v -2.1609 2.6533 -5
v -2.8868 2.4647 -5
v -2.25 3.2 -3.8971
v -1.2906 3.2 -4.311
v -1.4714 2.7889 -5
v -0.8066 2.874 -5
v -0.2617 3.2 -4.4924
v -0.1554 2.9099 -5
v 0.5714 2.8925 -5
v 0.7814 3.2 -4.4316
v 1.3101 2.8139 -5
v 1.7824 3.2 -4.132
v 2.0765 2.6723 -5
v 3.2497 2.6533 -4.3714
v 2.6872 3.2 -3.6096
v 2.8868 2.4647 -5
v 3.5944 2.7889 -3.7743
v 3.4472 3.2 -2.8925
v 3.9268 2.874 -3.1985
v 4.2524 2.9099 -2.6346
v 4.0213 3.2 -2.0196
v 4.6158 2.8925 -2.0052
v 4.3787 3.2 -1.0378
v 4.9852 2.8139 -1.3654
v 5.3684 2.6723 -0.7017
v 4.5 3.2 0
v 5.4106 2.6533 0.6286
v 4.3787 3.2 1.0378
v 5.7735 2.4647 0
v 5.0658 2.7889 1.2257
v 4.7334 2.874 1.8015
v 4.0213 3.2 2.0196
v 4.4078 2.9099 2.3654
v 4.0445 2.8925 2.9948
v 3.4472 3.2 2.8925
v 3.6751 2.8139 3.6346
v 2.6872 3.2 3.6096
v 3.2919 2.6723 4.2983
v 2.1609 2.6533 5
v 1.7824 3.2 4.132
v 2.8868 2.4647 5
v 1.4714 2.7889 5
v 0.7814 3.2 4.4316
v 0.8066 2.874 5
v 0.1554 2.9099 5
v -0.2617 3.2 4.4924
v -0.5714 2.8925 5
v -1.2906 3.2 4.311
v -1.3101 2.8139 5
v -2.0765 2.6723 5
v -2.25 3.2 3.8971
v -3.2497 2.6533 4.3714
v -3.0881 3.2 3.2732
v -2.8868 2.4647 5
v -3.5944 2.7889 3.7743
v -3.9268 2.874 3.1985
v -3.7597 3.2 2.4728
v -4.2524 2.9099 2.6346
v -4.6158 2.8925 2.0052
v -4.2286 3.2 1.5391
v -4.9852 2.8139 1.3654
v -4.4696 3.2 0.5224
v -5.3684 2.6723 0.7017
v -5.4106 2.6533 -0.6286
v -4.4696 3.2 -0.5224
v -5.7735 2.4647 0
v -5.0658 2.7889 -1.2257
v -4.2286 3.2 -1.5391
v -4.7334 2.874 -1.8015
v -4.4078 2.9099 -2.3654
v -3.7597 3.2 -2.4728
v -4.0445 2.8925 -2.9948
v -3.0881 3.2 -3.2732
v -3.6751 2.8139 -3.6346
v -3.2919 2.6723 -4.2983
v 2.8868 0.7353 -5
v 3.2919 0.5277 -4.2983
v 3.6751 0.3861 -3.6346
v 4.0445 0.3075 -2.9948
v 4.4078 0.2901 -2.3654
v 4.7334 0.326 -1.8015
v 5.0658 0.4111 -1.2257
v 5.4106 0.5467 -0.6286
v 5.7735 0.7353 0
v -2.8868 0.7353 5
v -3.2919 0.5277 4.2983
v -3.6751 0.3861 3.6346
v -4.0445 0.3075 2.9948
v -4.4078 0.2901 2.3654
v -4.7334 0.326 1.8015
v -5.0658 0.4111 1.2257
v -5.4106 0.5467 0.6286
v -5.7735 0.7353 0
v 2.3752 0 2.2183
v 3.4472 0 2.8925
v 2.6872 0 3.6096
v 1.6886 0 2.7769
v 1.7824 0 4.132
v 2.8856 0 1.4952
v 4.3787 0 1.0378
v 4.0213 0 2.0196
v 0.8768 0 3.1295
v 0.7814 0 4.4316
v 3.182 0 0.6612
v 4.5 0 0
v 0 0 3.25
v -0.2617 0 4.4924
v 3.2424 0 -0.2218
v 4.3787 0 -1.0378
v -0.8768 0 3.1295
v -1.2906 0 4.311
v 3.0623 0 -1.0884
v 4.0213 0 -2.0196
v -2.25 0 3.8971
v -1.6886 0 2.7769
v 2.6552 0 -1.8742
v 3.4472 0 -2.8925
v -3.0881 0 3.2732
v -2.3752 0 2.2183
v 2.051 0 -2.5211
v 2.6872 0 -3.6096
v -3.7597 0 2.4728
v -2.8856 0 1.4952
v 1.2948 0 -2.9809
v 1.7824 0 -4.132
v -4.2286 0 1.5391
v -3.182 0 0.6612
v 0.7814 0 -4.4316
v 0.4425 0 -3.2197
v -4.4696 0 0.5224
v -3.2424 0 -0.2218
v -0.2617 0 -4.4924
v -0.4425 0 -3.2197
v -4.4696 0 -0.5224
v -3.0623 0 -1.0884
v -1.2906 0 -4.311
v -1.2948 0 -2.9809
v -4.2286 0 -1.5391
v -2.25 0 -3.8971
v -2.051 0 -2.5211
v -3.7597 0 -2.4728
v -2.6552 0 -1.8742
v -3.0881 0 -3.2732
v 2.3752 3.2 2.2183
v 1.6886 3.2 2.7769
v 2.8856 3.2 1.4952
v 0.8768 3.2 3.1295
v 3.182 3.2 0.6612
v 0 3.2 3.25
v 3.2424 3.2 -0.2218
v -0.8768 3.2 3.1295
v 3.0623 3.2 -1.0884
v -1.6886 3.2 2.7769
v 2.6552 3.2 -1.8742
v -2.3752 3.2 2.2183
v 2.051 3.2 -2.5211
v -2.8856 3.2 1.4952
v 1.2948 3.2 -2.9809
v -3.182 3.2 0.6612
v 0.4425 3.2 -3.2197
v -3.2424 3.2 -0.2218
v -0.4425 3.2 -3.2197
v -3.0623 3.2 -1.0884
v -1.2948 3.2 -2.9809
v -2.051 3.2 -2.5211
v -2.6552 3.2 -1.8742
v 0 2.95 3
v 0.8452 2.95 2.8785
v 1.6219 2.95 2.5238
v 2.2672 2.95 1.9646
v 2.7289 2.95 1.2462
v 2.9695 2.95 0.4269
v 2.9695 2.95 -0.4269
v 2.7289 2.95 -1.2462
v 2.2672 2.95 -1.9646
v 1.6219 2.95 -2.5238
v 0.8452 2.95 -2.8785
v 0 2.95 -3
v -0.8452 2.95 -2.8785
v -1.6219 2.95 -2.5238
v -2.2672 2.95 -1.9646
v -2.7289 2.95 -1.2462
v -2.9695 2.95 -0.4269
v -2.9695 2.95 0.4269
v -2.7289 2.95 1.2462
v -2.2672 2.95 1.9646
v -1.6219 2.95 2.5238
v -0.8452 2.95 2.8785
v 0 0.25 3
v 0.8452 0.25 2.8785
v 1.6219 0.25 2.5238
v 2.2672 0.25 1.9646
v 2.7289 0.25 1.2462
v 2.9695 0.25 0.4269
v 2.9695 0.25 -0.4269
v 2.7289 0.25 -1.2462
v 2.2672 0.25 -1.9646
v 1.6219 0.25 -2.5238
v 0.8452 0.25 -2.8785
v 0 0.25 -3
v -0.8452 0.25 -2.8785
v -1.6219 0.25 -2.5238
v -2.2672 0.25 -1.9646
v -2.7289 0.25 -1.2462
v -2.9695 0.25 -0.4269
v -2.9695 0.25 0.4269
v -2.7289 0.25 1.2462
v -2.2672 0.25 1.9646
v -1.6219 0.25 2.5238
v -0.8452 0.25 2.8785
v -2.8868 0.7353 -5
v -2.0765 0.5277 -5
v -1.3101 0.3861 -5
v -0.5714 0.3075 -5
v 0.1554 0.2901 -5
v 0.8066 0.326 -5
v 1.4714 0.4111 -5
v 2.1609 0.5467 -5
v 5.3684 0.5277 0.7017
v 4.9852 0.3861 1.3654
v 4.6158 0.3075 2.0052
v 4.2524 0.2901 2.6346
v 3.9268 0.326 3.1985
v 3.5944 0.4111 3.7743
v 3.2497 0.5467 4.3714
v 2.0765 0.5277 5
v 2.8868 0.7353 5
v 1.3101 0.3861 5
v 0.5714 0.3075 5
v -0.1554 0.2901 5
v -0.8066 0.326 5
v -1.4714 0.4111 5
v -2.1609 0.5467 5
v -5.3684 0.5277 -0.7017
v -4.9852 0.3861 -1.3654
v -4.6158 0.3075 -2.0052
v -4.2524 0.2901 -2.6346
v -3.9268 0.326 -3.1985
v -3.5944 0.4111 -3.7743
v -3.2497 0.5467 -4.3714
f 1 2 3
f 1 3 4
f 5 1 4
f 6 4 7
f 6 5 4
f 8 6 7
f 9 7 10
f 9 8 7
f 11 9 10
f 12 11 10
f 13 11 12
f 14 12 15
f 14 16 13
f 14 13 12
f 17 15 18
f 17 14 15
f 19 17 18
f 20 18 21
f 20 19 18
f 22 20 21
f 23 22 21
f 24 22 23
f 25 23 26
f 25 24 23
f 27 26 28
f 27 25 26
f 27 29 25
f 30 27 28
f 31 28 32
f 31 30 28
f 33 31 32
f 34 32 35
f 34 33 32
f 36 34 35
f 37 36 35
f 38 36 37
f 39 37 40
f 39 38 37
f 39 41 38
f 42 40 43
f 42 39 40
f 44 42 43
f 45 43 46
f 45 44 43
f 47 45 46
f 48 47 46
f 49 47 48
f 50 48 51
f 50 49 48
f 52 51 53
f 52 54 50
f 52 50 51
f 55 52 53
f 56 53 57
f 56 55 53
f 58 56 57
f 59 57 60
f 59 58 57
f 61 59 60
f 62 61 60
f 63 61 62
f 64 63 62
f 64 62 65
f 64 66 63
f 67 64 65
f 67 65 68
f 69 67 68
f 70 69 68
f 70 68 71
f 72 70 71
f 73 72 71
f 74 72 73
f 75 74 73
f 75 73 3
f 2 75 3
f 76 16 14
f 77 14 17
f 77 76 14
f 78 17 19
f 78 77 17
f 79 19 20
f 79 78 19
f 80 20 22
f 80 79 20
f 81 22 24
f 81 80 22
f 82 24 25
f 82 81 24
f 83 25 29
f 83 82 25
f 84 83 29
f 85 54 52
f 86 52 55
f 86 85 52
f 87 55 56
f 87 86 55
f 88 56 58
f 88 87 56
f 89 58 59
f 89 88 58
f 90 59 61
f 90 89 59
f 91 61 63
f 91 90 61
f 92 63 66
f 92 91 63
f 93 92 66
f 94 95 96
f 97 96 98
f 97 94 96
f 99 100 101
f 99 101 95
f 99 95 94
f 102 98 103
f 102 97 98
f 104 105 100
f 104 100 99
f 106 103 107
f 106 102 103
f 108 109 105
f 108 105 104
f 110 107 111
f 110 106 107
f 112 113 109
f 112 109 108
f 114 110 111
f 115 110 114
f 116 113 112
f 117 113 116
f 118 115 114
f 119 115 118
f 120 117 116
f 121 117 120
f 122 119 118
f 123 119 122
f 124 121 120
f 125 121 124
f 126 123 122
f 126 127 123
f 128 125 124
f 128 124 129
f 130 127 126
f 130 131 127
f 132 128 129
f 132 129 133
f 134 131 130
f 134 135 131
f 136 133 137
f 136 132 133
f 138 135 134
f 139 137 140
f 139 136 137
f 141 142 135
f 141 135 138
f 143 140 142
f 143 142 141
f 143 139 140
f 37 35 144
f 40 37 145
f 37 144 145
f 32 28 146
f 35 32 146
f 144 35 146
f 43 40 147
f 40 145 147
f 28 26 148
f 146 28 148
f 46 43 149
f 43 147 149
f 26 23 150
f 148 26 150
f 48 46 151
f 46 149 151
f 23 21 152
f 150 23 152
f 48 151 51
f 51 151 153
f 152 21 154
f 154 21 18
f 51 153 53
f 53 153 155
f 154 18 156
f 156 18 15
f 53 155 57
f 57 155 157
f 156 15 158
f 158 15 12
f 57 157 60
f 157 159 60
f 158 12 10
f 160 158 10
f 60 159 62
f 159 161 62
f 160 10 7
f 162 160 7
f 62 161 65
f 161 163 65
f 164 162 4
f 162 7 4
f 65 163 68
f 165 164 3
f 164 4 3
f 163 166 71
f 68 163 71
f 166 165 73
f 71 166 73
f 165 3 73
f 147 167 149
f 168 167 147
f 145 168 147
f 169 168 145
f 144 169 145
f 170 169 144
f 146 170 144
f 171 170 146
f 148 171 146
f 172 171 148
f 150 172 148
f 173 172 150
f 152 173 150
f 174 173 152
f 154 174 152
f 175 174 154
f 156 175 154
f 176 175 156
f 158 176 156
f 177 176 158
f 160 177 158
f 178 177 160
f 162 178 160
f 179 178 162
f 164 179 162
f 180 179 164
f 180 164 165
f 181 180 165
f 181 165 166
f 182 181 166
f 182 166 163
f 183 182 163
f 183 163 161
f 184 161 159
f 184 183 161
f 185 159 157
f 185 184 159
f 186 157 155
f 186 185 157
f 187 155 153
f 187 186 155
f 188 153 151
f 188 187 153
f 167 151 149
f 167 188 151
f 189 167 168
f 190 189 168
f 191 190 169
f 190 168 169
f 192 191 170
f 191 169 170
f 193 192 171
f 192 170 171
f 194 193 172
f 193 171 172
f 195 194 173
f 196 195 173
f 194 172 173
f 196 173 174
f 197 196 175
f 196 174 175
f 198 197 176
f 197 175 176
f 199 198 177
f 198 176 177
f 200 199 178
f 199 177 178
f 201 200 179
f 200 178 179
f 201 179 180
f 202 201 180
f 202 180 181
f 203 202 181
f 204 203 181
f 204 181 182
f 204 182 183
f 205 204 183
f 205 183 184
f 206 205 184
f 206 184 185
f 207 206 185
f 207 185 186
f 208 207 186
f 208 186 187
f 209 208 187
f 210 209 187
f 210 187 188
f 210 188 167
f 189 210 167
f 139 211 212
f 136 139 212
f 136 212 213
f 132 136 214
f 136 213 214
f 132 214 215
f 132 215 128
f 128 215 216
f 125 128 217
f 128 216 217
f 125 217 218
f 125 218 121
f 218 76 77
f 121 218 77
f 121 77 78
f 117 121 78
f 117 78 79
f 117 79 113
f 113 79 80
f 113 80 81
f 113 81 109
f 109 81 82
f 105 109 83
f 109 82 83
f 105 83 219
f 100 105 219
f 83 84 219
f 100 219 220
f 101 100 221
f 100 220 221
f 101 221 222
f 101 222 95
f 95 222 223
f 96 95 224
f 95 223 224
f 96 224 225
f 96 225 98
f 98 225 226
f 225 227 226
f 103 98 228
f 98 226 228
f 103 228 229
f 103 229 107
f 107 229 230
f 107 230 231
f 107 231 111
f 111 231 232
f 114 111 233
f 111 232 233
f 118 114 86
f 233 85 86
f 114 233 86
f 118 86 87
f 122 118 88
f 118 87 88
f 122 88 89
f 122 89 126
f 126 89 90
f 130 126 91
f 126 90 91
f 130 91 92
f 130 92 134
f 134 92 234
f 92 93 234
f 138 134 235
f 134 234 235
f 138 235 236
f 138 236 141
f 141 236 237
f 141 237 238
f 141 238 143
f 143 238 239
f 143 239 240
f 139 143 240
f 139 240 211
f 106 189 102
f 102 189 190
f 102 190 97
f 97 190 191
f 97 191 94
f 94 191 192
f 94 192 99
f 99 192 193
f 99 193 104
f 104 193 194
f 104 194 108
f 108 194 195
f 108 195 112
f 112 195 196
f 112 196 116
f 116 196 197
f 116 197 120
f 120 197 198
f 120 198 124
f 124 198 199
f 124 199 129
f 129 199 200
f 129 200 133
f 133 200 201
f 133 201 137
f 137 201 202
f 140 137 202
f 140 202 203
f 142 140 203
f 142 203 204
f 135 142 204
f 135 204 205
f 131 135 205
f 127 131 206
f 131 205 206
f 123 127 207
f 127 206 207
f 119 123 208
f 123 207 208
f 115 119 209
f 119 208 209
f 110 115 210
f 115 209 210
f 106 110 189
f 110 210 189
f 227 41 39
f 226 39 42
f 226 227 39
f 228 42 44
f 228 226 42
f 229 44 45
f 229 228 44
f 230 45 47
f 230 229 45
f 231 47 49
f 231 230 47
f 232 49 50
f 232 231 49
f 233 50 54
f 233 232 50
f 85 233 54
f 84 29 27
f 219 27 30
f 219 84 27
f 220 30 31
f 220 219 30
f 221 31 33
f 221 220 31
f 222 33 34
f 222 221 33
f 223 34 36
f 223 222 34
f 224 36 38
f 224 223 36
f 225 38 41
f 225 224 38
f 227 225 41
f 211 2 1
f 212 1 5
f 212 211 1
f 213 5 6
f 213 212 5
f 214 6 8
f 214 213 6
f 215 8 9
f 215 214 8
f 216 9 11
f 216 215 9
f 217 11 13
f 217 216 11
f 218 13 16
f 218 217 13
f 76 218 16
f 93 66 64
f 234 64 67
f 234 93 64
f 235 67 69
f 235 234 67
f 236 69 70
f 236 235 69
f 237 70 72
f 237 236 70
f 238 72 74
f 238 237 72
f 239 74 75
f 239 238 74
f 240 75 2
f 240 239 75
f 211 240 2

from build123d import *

# Parameters (mm, degrees)
EXTRUDE_1_DEPTH     = 3.2
SKETCH_2_R          = 3
CUT_EXTRUDE_1_DEPTH = 5
CHAMFER_1_SIZE      = 0.25


with BuildPart() as part:
    # Эскиз1 → Вытянуть1 (new body)
    with BuildSketch(Plane(origin=(0, 0, 0), x_dir=(1, 0, 0), z_dir=(0, 1, 0))):
        Polygon((-2.886751346, 5), (2.886751346, 5), (5.773502692, 0), (2.886751346, -5), (-2.886751346, -5), (-5.773502692, 0), align=None)
    extrude(amount=EXTRUDE_1_DEPTH)

    # Эскиз2 → Вырез-Вытянуть1 (cut)
    with BuildSketch(Plane(origin=(0, 3.2, 0), x_dir=(-1, 0, 0), z_dir=(0, 1, 0))):
        with Locations(Location((0, 0, 0), (0, 0, 90))):
            Circle(SKETCH_2_R)
    extrude(amount=-CUT_EXTRUDE_1_DEPTH, mode=Mode.SUBTRACT)

    # Эскиз3 → Вырез-Повернуть1 (revolve, cut)
    with BuildSketch(Plane.XY, mode=Mode.PRIVATE) as cut_revolve_1_sk:
        Polygon((-4.5, 3.2), (-6.5, 2.045299462), (-6.5, 3.2), align=None)
        Polygon((-4.5, 0), (-6.5, 1.154700538), (-6.5, 0), align=None)
    revolve(cut_revolve_1_sk.sketch.rotate(Axis((0, 3.2, 0), (0, -1, 0)), 60.000000114), axis=Axis((0, 3.2, 0), (0, -1, 0)), mode=Mode.SUBTRACT)

    # Фаска1
    chamfer_1_edges = [part.edges().sort_by_distance(p)[0] for p in [
        (0, 0, -3),
        (0, 3.2, -3),
    ]]
    chamfer(chamfer_1_edges, length=CHAMFER_1_SIZE)


solid = part.part
